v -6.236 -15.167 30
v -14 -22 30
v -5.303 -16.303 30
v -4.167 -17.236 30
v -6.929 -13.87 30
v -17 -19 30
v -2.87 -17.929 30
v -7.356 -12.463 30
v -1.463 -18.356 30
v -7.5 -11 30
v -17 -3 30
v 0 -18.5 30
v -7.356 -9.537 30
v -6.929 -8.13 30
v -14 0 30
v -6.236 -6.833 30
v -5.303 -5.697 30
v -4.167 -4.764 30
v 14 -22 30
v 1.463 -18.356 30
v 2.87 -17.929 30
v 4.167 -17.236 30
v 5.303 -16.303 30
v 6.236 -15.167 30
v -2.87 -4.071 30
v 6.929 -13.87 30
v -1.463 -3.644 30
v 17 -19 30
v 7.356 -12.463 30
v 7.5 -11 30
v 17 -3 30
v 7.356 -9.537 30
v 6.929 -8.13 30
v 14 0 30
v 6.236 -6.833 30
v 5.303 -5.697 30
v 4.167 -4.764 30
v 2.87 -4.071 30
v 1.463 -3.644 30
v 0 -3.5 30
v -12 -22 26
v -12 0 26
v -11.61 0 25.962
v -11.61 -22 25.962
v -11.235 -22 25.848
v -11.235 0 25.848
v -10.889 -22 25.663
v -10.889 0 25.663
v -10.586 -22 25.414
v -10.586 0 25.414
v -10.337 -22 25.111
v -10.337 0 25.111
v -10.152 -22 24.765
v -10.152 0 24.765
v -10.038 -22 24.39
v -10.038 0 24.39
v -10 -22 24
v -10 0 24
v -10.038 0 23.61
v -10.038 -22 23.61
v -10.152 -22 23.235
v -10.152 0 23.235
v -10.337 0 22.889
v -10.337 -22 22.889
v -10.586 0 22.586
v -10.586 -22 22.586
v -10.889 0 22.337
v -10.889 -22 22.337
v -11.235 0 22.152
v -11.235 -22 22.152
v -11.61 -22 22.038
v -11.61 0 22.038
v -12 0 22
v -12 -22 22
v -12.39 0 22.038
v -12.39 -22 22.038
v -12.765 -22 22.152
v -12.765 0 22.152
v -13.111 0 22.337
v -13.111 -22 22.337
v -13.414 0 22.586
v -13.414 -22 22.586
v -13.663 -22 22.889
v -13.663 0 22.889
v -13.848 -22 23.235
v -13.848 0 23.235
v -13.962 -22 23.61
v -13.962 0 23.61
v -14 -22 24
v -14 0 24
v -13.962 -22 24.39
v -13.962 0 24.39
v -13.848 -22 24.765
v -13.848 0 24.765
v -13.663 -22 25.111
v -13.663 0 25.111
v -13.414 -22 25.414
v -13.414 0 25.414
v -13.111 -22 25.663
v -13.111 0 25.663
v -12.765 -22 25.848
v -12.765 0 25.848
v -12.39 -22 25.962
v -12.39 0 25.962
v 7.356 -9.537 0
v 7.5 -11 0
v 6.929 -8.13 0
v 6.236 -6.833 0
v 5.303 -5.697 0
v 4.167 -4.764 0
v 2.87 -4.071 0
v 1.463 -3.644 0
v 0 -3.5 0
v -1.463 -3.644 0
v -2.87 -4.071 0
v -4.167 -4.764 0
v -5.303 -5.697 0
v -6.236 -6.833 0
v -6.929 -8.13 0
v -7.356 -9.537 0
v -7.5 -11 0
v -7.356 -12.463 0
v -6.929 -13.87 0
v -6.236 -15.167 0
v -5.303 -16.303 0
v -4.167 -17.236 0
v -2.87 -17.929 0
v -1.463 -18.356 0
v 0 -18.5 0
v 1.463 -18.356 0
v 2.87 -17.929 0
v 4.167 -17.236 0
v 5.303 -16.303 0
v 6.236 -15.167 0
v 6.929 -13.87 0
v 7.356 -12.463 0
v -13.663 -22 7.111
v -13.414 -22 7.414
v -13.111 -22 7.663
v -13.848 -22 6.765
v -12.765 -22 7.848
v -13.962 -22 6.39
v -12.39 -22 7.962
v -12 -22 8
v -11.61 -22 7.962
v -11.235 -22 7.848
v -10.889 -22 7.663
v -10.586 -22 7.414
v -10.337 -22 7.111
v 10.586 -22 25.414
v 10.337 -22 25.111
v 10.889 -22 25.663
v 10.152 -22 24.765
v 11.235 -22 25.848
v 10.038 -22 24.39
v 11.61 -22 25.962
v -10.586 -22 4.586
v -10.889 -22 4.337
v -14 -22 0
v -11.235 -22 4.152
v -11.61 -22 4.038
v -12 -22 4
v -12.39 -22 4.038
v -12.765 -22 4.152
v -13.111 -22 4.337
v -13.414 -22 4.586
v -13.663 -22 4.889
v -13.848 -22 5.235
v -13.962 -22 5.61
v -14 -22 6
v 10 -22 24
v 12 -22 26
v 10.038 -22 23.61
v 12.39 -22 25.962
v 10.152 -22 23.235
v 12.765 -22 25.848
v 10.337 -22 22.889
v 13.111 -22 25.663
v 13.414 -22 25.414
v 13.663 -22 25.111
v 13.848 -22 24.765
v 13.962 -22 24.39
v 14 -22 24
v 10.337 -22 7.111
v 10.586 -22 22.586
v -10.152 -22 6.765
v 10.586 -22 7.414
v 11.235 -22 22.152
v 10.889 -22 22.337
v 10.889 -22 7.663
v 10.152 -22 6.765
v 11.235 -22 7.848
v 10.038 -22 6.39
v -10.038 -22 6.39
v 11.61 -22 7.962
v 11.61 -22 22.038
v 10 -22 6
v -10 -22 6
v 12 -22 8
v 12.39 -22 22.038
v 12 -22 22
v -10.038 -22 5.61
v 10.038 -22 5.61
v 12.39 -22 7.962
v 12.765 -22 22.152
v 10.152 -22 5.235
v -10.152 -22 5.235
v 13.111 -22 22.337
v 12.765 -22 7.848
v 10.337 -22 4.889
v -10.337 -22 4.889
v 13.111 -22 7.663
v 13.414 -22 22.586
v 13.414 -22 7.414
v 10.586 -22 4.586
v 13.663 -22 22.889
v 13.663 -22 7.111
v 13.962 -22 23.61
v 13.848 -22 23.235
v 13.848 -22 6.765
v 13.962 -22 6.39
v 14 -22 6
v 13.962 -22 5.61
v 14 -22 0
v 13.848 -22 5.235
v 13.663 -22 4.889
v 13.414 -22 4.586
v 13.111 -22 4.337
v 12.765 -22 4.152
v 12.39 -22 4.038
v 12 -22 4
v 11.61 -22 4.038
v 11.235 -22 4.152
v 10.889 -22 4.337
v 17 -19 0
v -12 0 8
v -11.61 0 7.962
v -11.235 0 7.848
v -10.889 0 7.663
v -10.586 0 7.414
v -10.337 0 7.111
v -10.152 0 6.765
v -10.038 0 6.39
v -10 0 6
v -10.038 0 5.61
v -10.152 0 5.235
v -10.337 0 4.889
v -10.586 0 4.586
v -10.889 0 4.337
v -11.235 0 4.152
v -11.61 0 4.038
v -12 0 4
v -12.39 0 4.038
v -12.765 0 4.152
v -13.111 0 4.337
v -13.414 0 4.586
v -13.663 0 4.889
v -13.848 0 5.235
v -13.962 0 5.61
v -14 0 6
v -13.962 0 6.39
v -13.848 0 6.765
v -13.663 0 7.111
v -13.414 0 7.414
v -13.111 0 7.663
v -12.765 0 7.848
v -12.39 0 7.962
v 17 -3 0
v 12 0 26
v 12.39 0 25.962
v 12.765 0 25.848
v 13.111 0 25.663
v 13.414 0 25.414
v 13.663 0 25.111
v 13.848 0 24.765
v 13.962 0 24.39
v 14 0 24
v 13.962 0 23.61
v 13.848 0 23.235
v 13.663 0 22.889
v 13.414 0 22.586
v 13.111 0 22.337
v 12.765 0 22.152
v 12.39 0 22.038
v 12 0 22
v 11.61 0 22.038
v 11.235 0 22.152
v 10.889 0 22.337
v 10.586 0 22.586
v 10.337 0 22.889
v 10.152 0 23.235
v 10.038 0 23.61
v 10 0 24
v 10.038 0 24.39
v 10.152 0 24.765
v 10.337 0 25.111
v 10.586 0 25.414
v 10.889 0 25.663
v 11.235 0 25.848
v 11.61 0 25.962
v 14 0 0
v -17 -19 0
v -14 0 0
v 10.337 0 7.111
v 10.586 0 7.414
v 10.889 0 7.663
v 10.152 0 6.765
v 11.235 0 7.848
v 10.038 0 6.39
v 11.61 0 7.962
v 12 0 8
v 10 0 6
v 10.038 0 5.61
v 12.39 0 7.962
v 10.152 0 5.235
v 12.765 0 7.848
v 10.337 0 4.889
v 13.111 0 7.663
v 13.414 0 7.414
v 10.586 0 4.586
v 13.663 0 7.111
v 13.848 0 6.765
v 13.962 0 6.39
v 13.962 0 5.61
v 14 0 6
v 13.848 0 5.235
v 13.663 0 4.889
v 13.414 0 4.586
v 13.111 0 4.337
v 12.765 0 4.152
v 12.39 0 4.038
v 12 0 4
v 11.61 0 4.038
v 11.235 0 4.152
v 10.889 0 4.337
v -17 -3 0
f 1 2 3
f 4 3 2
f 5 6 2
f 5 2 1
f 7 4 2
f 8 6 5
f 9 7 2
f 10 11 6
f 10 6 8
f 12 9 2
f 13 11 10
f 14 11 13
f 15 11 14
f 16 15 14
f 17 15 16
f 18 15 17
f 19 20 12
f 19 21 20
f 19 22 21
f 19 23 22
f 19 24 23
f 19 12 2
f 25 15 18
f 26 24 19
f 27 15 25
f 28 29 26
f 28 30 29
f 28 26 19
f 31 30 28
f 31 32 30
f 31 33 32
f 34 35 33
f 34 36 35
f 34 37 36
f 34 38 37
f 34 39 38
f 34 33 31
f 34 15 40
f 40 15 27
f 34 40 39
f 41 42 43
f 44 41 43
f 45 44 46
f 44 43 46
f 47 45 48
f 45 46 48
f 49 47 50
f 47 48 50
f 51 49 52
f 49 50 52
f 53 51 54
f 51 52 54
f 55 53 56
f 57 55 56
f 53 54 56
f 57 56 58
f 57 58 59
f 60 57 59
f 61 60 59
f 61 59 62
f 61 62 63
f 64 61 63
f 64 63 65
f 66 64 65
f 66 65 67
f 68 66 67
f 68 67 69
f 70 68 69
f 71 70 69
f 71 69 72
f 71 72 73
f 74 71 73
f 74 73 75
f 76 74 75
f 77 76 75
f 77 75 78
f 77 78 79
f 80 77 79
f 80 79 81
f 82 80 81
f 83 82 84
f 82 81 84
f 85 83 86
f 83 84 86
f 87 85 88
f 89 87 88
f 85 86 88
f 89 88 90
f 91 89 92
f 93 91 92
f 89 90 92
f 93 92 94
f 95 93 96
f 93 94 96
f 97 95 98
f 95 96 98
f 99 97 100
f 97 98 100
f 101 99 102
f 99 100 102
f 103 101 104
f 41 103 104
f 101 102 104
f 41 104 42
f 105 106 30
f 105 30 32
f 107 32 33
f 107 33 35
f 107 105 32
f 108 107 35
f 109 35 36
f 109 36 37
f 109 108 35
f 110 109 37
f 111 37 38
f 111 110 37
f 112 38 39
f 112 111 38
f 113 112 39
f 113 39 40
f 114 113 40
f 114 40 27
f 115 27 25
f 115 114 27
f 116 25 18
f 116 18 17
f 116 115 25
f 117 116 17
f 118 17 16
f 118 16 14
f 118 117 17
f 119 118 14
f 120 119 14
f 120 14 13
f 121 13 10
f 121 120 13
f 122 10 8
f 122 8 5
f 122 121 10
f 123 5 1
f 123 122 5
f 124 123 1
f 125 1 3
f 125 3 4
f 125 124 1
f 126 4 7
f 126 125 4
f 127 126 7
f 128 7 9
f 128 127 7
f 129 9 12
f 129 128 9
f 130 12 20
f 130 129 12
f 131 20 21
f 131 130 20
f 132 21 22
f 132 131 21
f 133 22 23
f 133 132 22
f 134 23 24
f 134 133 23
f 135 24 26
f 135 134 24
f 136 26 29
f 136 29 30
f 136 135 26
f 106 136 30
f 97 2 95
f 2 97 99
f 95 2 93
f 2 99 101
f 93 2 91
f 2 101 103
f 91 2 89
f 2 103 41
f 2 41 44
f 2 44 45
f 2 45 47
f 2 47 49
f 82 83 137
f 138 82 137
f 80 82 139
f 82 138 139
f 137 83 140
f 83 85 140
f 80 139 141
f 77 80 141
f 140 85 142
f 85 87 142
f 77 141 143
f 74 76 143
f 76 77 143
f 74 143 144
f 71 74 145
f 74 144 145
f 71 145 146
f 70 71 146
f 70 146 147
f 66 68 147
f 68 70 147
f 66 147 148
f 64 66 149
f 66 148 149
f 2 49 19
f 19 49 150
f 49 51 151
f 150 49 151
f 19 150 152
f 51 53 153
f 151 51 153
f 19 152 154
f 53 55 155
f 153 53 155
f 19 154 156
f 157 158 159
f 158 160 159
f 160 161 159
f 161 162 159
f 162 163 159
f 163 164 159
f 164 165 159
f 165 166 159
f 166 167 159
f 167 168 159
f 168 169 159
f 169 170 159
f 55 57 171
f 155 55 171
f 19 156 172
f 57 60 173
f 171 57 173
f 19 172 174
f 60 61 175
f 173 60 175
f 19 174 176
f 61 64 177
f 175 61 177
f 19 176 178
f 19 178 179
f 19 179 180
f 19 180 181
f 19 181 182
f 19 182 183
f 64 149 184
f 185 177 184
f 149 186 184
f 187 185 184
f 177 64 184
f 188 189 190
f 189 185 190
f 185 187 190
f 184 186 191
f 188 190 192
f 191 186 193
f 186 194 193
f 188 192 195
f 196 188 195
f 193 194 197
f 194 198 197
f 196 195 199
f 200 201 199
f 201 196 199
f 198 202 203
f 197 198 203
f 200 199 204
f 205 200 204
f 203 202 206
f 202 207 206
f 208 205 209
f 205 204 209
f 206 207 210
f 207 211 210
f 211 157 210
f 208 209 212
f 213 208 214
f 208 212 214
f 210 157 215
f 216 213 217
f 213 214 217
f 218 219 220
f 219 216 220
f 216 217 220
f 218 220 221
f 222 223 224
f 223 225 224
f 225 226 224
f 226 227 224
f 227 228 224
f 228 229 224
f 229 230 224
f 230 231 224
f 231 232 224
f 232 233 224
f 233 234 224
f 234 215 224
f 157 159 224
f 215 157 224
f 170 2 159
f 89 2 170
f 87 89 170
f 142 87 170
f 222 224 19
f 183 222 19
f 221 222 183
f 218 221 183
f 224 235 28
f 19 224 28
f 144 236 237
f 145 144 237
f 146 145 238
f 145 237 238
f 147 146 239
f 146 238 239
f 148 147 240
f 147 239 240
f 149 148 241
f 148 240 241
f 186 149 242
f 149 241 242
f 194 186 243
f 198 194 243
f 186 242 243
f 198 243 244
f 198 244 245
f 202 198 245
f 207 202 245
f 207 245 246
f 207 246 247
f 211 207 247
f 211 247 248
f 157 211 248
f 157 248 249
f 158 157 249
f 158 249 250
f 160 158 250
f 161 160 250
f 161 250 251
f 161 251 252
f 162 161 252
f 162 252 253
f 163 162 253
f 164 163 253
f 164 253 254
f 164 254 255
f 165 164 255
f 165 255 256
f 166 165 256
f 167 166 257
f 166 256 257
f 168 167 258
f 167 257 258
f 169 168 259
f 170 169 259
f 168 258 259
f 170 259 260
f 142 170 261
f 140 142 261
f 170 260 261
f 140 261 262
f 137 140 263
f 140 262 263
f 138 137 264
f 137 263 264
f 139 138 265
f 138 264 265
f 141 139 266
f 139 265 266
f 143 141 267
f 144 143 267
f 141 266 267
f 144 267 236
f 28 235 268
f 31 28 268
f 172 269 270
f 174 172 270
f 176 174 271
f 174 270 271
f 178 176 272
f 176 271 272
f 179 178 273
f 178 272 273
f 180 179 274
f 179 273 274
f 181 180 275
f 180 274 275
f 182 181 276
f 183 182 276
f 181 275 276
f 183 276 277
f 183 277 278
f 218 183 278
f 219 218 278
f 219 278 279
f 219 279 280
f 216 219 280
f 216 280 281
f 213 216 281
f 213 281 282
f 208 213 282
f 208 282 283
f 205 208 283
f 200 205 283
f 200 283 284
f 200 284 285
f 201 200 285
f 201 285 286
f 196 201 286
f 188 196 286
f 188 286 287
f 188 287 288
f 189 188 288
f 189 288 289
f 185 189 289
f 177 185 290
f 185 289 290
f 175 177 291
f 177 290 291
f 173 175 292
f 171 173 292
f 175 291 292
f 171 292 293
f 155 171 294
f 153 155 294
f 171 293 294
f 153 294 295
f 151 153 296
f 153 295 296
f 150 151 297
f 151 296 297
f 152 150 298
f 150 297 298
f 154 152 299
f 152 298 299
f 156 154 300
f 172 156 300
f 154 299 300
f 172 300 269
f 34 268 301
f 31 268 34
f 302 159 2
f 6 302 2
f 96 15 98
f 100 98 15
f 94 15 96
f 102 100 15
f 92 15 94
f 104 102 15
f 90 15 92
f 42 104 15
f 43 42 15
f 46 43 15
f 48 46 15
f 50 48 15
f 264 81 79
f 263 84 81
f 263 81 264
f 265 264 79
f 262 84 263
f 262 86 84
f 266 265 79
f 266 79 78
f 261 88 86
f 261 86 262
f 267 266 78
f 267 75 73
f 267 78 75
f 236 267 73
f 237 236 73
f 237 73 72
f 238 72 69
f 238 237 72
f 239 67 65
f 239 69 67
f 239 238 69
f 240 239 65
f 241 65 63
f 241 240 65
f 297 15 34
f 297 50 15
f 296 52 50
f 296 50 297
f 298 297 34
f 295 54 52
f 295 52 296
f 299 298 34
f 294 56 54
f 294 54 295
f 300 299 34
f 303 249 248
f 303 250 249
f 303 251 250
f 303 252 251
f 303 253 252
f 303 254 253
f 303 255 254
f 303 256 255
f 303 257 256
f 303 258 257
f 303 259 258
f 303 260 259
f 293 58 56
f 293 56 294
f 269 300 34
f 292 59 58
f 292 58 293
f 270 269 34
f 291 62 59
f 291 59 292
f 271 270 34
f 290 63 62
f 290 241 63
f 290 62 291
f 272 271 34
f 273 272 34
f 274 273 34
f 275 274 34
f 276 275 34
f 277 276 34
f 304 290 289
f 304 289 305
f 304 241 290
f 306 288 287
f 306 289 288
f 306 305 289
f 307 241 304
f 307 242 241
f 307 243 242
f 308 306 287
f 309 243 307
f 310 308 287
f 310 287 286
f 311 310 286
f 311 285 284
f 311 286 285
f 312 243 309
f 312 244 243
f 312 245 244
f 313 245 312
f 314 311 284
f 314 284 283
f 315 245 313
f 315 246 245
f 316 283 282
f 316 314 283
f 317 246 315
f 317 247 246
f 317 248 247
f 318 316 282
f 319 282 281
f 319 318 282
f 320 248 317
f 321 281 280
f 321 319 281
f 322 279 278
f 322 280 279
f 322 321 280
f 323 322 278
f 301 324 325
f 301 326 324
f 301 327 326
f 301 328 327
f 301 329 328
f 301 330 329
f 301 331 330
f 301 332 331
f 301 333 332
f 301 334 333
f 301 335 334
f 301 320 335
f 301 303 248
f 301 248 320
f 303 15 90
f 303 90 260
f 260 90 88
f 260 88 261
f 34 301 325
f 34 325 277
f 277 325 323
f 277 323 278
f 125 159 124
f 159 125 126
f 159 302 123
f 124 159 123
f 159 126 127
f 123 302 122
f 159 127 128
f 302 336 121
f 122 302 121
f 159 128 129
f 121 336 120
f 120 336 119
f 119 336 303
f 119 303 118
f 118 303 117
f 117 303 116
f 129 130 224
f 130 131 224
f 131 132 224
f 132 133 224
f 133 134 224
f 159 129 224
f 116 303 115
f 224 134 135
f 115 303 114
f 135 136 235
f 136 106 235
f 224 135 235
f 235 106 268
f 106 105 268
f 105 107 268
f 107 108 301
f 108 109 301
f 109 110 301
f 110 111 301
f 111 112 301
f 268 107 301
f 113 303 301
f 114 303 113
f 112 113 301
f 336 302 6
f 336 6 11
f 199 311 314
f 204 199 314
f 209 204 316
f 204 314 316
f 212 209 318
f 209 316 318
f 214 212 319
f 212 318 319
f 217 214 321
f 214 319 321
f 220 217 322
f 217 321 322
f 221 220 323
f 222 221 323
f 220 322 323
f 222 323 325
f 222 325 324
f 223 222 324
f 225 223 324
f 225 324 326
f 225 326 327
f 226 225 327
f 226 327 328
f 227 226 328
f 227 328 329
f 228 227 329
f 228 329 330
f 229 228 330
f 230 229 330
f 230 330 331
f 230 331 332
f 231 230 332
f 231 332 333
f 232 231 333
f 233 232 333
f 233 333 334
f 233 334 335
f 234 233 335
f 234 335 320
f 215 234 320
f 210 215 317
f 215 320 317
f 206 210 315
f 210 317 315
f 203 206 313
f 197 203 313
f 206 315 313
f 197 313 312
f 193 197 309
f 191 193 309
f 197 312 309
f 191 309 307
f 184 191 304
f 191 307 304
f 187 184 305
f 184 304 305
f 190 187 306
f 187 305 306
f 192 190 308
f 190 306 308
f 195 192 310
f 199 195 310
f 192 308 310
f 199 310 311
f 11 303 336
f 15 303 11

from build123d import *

# Parameters (mm, degrees)
CROQUIS1_W              = 34
CROQUIS1_H              = 22
CROQUIS1_R              = 7.5
SALIENTE_EXTRUIR1_DEPTH = 30
CROQUIS2_R              = 2
CORTAR_EXTRUIR1_DEPTH   = 30
CHAFL_N1_SIZE           = 3


with BuildPart() as part:
    # Croquis1 → Saliente-Extruir1 (new body)
    with BuildSketch(Plane.XY):
        with Locations((0, -11)):
            Rectangle(CROQUIS1_W, CROQUIS1_H)
        with Locations((0, -11)):
            Circle(CROQUIS1_R, mode=Mode.SUBTRACT)
    extrude(amount=SALIENTE_EXTRUIR1_DEPTH)

    # Croquis2 → Cortar-Extruir1 (cut)
    with BuildSketch(Plane(origin=(0, 0, 0), x_dir=(1, 0, 0), z_dir=(0, 1, 0))):
        with Locations(Location((-12, -6, 0), (0, 0, 270))):
            Circle(CROQUIS2_R)
        with Locations(Location((12, -6, 0), (0, 0, 270))):
            Circle(CROQUIS2_R)
        with Locations(Location((-12, -24, 0), (0, 0, 270))):
            Circle(CROQUIS2_R)
        with Locations(Location((12, -24, 0), (0, 0, 270))):
            Circle(CROQUIS2_R)
    extrude(amount=-CORTAR_EXTRUIR1_DEPTH, mode=Mode.SUBTRACT)

    # Chaflán1
    chafl_n1_edges = [part.edges().sort_by_distance(p)[0] for p in [
        (17, -22, 15),
        (-17, -22, 15),
        (-17, 0, 15),
        (17, 0, 15),
    ]]
    chamfer(chafl_n1_edges, length=CHAFL_N1_SIZE - 0.0001)  # a hair under: the kernel refuses the full size


solid = part.part
